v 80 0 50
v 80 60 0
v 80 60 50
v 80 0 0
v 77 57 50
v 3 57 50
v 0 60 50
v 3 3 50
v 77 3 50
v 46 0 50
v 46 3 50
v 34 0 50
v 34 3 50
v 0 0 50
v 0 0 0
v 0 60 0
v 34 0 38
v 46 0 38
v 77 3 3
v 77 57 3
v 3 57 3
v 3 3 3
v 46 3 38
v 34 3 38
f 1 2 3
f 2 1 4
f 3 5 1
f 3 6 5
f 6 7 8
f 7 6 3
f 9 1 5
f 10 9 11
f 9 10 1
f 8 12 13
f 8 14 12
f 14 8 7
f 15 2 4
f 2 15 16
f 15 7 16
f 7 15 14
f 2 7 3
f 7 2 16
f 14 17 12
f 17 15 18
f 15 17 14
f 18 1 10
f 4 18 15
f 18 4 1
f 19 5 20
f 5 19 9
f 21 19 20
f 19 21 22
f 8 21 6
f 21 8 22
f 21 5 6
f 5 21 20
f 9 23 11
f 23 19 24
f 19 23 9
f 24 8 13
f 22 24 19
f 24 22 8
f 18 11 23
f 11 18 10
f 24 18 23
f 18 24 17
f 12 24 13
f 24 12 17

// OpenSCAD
$fn = 32;

// ----------------------------------------------------------------------
// Enclosure box: notch enclosure
// ----------------------------------------------------------------------

// --- parameters (mm) ---
box_l = 80;               // outer length, X
box_w = 60;               // outer width, Y
box_h = 50;               // outer height
wall_t = 3;               // wall thickness
notch_w = 12;             // cable notch width
notch_h = 12;             // cable notch height

inner_h = box_h - wall_t;  // cavity depth
boss_h = inner_h - 2;  // corner boss height

difference() {
  cube([box_l, box_w, box_h]);
  translate([wall_t, wall_t, wall_t])
    cube([box_l - 2 * wall_t, box_w - 2 * wall_t, box_h]);
  translate([box_l / 2 - notch_w / 2, -1, box_h - notch_h])
    cube([notch_w, wall_t + 2, notch_h + 1]);
}
